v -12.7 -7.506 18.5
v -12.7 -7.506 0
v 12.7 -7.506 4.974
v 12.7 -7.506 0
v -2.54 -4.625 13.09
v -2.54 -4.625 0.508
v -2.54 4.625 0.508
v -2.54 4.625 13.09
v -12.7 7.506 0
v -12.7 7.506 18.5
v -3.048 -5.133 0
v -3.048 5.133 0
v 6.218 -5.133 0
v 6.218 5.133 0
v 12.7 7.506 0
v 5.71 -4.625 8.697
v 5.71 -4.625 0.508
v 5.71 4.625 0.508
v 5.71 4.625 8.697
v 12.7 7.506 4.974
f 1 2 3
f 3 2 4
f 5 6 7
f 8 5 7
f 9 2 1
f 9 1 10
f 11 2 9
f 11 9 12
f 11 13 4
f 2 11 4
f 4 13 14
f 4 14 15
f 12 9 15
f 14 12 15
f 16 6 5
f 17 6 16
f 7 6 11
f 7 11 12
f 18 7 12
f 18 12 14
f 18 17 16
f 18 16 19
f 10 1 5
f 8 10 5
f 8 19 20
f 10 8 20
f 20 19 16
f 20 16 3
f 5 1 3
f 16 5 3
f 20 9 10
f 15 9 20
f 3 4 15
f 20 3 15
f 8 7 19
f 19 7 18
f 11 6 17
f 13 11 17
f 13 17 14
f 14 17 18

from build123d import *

# Parameters (mm, degrees)
F0_W     = 25.4
F0_H     = 15.0114
F0_W_2   = 8.25
F0_H_2   = 9.25
F1_DEPTH = 18.5
F3_DEPTH = 25.4
F4_SIZE  = 0.508


with BuildPart() as f1:
    # F0 (on Top) → F1 (new body)
    with BuildSketch(Plane.XY):
        Rectangle(F0_W, F0_H)
        with Locations((1.585, 0)):
            Rectangle(F0_W_2, F0_H_2, mode=Mode.SUBTRACT)
    extrude(amount=F1_DEPTH)

    # F2 (on face) → F3 (cut)
    with BuildSketch(Plane.XZ.offset(7.5057)):
        Polygon((12.7, 18.5), (-12.7, 18.5), (12.7, 4.97428), align=None)
    extrude(amount=-F3_DEPTH, mode=Mode.SUBTRACT)

    # F4
    f4_edges = [f1.edges().sort_by_distance(p)[0] for p in [
        (-2.54, 0, 0),
        (1.585, 4.625, 0),
        (5.71, 0, 0),
        (1.585, -4.625, 0),
    ]]
    chamfer(f4_edges, length=F4_SIZE)


solid = f1.part
